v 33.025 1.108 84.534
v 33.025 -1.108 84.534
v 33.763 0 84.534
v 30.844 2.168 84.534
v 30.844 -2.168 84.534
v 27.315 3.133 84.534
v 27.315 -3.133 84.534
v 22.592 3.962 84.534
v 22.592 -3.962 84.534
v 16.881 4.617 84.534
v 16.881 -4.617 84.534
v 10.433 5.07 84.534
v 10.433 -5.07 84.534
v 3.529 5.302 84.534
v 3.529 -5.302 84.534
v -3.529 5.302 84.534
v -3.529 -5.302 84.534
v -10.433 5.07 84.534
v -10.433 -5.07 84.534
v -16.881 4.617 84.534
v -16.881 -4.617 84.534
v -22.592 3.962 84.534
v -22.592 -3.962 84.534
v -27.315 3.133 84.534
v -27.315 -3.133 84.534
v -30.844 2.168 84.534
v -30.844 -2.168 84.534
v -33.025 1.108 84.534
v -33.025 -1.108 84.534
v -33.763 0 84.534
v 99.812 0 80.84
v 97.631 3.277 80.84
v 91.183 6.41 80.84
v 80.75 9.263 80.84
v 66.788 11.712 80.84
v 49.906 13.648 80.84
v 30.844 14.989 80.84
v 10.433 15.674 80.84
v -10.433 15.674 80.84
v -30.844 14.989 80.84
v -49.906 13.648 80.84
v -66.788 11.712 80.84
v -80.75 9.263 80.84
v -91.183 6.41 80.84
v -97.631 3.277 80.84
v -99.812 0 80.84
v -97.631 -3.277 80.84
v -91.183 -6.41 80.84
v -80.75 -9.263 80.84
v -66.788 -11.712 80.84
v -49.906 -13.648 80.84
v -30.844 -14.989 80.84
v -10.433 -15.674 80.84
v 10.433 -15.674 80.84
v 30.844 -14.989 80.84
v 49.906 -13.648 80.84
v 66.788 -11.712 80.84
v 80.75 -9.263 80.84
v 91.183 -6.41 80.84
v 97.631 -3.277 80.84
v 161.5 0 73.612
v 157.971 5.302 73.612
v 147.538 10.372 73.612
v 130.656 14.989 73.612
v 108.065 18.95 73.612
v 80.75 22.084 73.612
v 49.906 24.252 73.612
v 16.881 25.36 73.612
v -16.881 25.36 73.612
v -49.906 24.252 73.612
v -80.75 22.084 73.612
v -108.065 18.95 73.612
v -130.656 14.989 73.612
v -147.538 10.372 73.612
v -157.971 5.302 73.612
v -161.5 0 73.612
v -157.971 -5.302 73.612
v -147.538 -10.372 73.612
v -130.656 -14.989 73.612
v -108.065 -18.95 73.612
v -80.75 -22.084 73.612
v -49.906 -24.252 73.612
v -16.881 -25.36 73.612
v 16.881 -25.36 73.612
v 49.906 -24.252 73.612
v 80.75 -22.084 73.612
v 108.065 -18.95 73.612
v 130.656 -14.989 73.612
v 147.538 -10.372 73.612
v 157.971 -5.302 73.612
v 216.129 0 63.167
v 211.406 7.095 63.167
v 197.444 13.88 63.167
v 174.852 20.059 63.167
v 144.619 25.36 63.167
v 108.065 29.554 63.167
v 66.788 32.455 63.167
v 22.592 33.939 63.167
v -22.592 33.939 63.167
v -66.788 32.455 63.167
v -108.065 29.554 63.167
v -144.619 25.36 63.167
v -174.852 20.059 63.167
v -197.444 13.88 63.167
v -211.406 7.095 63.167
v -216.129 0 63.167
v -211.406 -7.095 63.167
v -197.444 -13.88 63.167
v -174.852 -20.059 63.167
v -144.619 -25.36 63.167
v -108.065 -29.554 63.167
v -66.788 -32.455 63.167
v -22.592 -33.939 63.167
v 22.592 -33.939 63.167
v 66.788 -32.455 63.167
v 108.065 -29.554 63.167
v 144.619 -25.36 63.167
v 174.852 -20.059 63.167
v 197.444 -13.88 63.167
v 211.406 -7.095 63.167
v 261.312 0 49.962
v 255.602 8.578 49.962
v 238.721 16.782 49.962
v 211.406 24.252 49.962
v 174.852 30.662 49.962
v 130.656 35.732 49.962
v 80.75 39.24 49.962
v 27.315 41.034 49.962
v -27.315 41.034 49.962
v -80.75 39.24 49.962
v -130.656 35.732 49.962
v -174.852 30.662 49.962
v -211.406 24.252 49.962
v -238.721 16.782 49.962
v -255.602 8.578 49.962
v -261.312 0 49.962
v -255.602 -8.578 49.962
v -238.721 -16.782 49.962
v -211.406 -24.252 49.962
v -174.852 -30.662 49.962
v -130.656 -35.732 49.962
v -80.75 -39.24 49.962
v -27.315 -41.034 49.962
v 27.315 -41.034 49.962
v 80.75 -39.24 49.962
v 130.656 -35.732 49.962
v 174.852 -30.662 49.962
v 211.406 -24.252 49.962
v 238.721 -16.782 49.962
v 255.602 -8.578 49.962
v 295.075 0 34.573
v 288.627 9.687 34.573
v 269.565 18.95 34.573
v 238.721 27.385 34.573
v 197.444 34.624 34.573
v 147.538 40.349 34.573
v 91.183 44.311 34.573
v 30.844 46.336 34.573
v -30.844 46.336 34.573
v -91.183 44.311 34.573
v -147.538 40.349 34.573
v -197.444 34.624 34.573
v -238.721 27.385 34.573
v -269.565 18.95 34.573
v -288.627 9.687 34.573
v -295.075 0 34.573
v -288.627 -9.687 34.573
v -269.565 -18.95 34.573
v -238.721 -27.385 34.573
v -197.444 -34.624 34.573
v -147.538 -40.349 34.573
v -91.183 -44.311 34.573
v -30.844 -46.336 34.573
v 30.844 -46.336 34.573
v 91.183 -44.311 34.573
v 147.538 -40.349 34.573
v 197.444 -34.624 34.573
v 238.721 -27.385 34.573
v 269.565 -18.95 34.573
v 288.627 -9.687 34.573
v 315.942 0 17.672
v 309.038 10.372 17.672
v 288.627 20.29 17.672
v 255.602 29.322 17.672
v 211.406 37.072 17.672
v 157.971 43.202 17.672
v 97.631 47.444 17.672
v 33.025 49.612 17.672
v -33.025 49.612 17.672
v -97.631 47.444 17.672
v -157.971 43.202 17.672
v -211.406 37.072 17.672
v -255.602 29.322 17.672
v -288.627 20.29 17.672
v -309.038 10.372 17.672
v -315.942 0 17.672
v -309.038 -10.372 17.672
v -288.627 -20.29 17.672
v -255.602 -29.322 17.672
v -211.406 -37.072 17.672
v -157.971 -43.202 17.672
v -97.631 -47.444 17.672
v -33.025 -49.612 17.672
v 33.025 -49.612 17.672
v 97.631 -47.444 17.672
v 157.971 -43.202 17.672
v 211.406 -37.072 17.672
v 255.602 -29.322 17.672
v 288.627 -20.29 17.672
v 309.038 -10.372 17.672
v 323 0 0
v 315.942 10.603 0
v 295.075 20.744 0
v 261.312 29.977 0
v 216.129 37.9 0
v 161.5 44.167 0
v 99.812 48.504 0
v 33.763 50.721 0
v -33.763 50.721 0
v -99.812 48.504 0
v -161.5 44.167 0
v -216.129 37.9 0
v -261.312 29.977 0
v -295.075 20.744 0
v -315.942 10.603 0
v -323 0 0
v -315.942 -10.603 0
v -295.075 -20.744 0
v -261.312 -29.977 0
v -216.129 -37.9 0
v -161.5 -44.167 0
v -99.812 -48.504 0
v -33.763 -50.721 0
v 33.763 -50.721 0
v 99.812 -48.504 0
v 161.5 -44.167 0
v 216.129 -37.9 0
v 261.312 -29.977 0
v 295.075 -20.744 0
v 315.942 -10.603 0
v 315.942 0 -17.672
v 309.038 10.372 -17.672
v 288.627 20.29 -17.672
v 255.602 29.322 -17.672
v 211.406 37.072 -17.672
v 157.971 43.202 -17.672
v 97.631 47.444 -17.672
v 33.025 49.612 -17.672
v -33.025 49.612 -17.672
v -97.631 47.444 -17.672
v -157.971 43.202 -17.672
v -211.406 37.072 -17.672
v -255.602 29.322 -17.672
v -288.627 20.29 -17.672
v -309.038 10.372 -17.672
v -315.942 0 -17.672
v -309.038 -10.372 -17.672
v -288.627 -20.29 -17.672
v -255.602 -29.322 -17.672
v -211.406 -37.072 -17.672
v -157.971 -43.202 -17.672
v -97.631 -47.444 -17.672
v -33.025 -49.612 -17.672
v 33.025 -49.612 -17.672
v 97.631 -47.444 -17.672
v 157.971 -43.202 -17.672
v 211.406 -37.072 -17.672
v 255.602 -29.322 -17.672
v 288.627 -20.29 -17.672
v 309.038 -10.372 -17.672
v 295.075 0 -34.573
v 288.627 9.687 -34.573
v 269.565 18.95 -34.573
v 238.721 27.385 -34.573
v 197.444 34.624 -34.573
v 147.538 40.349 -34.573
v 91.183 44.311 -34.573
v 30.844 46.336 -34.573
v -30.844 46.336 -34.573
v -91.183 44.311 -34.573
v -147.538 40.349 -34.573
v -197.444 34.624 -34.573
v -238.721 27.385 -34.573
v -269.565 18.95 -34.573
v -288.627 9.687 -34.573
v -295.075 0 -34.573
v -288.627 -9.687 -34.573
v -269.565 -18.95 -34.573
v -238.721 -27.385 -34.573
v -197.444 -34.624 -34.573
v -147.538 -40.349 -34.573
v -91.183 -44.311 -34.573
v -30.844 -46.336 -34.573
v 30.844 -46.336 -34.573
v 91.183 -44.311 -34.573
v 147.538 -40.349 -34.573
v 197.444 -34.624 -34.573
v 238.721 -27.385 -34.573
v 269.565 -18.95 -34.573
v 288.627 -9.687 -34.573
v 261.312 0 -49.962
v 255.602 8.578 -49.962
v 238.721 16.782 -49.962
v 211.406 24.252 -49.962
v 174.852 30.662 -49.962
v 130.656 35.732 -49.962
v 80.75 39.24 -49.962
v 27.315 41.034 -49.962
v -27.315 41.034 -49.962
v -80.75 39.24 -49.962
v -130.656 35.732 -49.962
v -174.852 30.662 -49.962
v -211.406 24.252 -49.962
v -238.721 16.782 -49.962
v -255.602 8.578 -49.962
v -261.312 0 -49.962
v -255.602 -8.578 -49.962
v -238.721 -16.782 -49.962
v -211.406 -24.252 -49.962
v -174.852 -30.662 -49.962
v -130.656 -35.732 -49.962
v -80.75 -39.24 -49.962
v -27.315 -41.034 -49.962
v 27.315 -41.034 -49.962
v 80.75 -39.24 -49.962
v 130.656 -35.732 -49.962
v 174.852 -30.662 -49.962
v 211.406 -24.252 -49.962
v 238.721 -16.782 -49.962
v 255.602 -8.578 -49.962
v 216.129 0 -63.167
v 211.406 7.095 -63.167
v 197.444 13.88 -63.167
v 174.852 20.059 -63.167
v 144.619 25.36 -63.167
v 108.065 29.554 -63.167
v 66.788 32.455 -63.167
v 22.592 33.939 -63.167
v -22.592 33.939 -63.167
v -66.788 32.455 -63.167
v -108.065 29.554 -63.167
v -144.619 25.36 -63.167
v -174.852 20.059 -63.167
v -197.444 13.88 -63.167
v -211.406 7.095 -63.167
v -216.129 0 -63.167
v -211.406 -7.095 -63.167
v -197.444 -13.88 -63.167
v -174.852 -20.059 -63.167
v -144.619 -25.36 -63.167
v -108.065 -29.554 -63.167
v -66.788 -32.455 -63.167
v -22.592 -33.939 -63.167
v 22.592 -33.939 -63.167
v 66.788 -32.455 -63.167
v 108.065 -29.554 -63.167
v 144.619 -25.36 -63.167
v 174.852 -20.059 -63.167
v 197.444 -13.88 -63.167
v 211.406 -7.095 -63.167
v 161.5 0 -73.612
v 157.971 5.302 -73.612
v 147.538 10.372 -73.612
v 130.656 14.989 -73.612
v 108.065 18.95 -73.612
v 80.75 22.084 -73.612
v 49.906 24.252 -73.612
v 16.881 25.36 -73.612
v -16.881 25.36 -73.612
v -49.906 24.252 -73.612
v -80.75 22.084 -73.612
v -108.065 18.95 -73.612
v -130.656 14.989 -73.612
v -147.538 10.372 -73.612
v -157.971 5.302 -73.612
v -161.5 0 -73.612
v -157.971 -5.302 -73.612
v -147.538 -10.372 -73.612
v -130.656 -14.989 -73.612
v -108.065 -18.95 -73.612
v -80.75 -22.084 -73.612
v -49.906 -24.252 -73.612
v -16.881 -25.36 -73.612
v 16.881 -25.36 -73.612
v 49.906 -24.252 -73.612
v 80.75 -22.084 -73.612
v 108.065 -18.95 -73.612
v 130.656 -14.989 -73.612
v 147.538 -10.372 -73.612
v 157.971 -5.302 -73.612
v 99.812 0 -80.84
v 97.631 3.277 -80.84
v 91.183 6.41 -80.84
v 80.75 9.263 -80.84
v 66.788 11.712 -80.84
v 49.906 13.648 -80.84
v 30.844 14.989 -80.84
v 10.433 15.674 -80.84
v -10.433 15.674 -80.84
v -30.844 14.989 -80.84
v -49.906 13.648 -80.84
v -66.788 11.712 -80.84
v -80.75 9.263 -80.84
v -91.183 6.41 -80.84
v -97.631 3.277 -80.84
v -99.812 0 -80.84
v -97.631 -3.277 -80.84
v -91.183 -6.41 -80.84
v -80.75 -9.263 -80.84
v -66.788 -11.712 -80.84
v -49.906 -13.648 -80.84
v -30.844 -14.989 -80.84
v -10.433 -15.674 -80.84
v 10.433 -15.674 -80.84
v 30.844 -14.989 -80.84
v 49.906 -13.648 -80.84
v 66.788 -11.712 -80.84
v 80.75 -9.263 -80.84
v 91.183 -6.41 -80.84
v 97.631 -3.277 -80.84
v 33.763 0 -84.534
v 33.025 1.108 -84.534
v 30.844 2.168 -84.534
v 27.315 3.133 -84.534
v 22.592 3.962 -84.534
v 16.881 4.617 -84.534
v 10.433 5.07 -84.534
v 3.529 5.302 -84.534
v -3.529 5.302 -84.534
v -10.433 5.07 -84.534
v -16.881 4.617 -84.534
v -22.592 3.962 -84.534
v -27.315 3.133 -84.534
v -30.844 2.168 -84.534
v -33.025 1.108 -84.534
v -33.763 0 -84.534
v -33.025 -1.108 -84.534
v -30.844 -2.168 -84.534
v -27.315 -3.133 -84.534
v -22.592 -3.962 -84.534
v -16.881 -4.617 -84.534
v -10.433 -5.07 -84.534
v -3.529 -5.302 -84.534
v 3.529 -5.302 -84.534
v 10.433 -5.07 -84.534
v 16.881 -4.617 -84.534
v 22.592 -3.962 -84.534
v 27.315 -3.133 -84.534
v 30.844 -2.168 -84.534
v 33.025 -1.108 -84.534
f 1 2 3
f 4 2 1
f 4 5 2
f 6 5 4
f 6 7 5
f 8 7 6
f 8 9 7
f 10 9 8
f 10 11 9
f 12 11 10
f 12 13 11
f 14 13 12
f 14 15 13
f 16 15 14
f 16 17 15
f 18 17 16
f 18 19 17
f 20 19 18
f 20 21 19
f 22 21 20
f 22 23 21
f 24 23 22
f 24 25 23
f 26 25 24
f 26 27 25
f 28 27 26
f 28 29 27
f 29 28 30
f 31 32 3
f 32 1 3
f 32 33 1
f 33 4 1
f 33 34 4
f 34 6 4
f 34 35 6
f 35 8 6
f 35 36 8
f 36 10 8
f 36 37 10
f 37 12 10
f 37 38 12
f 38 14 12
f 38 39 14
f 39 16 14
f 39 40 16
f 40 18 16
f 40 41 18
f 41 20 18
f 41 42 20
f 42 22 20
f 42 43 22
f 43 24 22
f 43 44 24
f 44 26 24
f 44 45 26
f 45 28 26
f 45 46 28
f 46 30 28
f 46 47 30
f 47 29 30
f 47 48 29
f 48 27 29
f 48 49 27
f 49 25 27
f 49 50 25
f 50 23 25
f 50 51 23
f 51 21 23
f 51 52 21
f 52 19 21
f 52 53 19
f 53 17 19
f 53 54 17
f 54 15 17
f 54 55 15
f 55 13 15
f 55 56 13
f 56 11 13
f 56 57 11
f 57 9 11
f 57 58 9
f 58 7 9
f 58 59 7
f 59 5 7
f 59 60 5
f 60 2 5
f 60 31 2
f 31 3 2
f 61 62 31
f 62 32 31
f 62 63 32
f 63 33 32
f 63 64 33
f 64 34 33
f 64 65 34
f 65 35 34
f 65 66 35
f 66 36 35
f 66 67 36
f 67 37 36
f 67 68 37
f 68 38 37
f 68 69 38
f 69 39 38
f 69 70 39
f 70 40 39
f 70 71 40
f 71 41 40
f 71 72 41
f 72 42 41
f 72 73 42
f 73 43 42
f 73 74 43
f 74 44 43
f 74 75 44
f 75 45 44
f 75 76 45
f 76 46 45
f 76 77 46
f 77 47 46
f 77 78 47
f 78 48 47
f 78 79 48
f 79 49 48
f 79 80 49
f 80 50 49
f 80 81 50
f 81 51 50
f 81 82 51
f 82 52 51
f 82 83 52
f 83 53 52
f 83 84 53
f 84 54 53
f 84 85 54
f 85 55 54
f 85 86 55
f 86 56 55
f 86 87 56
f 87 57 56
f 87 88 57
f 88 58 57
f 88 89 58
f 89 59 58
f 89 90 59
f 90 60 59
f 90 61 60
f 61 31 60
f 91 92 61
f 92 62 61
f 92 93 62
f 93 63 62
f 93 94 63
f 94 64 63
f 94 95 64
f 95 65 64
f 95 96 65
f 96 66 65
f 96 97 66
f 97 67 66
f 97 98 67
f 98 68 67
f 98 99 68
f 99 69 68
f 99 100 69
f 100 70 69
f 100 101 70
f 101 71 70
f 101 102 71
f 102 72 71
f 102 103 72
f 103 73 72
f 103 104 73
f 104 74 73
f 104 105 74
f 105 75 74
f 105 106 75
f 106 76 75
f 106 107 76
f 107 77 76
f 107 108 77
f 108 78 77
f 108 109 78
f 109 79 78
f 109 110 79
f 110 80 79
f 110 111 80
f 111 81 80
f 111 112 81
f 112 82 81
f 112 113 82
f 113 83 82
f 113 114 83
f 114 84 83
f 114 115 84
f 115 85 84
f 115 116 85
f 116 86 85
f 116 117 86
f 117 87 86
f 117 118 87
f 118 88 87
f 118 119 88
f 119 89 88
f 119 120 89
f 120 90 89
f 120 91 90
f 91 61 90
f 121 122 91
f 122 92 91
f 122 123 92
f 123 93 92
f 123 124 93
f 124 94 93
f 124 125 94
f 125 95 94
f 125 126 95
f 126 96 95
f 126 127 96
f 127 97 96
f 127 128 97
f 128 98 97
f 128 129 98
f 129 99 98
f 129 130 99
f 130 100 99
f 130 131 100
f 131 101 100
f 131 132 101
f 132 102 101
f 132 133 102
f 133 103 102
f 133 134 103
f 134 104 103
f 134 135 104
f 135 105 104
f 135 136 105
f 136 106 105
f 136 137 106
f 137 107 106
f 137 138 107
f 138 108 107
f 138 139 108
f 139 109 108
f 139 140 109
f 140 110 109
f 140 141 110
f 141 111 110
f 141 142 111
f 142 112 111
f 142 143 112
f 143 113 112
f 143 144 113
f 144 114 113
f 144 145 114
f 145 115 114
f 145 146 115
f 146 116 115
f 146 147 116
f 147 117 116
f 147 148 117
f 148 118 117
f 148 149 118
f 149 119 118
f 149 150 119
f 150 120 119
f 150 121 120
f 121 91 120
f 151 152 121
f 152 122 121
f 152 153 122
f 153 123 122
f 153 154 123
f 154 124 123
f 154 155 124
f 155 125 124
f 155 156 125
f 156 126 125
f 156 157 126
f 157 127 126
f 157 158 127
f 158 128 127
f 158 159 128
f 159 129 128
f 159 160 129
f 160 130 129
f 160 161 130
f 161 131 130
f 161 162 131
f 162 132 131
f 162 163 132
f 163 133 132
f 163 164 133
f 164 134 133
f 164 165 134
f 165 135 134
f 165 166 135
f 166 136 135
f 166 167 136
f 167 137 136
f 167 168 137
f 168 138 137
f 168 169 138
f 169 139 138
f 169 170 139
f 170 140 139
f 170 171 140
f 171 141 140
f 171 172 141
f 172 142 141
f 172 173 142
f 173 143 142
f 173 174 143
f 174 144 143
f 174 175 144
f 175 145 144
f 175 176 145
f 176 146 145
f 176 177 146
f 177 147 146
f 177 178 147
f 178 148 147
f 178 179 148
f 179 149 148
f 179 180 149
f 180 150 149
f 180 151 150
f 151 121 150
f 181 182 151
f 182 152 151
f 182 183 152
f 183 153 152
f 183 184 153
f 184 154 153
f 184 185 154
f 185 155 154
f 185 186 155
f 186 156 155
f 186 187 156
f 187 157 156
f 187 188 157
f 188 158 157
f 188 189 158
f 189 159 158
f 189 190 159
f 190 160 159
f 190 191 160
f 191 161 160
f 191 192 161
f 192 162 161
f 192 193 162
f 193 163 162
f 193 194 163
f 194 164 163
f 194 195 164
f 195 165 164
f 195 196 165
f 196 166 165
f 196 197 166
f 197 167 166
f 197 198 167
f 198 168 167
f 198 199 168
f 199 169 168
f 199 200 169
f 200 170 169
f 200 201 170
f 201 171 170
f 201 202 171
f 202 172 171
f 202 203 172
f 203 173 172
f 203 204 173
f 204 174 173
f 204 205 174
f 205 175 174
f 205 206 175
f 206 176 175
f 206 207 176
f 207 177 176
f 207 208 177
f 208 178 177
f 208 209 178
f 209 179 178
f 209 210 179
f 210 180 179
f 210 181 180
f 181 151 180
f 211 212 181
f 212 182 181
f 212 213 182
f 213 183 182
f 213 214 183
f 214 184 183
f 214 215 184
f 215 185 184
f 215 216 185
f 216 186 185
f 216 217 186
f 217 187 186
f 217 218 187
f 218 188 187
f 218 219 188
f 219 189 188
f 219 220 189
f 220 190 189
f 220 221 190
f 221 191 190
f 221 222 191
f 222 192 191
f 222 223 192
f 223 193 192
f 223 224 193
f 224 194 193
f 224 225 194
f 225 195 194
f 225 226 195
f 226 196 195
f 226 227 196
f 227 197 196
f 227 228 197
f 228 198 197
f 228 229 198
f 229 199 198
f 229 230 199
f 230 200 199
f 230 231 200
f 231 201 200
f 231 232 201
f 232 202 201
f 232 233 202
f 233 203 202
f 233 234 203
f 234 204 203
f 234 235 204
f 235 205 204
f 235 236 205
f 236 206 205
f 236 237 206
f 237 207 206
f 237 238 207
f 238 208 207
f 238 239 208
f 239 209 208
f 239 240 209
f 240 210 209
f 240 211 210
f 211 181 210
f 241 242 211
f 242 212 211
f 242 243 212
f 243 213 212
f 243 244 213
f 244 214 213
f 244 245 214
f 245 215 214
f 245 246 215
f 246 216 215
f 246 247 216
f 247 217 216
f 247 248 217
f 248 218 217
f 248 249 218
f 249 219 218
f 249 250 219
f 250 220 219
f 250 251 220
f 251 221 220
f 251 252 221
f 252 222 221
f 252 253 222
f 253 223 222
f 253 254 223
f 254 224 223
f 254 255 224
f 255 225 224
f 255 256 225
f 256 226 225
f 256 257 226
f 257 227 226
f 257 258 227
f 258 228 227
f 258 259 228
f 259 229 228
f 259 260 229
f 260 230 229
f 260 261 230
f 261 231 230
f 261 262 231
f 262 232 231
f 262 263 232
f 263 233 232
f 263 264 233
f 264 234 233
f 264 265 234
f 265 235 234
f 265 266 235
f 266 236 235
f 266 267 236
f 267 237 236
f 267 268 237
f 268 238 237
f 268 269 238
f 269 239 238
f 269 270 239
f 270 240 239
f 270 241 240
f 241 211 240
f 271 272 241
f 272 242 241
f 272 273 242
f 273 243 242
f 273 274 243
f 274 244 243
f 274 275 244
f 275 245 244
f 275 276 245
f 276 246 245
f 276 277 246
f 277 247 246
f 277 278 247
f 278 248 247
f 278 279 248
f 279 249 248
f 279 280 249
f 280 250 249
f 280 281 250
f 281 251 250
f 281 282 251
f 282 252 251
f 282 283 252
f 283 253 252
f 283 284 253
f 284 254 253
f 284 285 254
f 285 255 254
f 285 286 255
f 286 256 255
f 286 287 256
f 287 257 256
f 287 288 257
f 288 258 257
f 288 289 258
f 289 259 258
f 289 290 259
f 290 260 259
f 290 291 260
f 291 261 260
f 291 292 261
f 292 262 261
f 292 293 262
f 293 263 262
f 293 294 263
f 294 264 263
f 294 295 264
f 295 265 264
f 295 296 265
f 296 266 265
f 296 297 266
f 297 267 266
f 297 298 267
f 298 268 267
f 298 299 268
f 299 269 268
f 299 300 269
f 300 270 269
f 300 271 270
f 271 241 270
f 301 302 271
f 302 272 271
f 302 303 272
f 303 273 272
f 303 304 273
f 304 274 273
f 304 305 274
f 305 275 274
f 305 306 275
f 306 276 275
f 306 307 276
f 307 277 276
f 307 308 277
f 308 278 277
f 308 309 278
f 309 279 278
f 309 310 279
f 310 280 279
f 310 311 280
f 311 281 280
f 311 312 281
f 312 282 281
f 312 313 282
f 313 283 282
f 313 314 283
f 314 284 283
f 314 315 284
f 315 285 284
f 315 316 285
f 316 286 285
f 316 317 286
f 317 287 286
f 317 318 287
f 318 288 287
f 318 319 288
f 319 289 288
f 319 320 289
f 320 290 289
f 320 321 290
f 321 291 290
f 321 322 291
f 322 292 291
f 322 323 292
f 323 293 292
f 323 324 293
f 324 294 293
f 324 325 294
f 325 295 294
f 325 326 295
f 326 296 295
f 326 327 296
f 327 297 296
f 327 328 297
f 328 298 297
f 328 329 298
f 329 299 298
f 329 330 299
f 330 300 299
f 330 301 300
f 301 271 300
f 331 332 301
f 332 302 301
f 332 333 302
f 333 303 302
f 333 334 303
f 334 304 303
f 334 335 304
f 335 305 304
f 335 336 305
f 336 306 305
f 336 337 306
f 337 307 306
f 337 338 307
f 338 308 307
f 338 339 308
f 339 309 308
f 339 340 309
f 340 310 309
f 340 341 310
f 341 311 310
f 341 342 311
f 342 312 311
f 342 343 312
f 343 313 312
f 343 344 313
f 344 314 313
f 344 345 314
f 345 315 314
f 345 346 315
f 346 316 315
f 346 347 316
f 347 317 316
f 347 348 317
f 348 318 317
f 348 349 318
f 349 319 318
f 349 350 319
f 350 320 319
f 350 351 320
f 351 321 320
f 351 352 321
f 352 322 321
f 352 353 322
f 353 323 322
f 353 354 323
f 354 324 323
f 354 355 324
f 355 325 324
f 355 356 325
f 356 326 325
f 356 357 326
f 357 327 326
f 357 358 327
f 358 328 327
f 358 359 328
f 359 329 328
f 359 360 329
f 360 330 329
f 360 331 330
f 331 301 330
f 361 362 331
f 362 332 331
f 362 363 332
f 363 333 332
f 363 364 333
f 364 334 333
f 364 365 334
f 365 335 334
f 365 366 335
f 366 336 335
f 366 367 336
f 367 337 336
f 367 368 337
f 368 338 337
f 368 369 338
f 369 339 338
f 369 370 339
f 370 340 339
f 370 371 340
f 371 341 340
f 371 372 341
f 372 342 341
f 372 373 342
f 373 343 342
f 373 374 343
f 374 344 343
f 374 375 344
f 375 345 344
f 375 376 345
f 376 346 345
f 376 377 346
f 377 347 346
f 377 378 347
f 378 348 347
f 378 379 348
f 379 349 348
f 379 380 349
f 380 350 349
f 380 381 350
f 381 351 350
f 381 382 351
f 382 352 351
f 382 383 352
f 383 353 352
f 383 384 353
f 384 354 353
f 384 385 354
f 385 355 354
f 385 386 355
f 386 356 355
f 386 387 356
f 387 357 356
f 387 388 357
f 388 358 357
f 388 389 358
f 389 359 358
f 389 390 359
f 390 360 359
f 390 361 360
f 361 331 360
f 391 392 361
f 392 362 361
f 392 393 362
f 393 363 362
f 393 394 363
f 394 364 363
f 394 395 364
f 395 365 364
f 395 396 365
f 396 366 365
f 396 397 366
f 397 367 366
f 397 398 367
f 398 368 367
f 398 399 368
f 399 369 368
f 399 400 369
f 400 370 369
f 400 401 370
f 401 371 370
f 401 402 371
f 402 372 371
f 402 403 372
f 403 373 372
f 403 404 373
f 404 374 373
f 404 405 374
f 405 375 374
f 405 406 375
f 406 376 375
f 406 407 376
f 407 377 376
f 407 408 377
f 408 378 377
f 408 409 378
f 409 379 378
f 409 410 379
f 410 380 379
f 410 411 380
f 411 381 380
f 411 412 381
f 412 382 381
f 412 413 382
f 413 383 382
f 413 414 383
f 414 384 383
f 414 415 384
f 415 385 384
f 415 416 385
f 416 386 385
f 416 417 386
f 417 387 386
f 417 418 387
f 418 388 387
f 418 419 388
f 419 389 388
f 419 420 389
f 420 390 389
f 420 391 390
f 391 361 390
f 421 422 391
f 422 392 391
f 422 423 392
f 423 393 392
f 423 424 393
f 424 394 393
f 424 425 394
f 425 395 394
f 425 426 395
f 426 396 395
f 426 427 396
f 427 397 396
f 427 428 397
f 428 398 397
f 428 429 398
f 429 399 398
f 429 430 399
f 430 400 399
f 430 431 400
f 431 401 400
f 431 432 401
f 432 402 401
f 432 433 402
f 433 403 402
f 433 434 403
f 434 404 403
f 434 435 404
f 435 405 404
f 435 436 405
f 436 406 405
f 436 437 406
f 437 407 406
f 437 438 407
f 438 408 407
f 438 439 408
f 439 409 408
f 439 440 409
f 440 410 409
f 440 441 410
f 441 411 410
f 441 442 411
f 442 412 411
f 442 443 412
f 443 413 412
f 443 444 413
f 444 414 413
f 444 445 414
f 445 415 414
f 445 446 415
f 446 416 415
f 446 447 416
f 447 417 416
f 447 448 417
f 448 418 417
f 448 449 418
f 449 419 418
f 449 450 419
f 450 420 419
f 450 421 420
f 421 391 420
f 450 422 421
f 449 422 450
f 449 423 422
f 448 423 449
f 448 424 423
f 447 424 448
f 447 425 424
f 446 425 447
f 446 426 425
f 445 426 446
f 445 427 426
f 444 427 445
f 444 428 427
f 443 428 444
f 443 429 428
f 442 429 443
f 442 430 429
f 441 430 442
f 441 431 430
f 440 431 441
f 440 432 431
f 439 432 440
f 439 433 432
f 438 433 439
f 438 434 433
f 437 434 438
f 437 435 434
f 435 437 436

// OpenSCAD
// Generated by SolidPython 1.0.1 on 2020-07-29 00:46:53


scale(v = [19, 3, 5]) {
	sphere(r = 17);
}
/***********************************************
*********      SolidPython code:      **********
************************************************
 
# import packages: SolidPython
from solid import *
from solid.utils import *
from itertools import chain, combinations, permutations


class Resize:

    def __init__(self, scad_file):
        self.scad_file = scad_file
        #self.scad_file = import_scad(scad_file)
        # cone/cylinder param:
        self.r1 = 0
        self.r2 = 0
        self.h = 0
        # rectangular prism param:
        self.w = 0
        self.l = 0
        # ellipse param:
        self.r = 0

    # import OpenScad code (file name corresponds to shape)


    # classify shape + parameters
    def assign(self, param1, param2, param3):
        if self.scad_file == 'cone.scad':
            self.r1 = param1
            self.r2 = param2
            self.h = param3
        elif self.scad_file == 'cylinder.scad':
            self.r1 = param1
            self.r2 = param2
            self.h = param3
        elif self.scad_file == 'rectangularPrism.scad':
            self.h = param1
            self.l = param2
            self.w = param3
        else:
            self.r = param1
            self.h = param2

    # resize parameters
    def iterate(self):
        x = range(3, 20, 2)
        i = 1
        if self.scad_file == 'cone.scad':
            tempList = list(permutations(x, 2))
            for temp in tempList:
                param1 = temp[0]
                param2 = temp[1]
                filepath = 'produced_scad_files/' + 'cone' + str(param1) + '_' + str(param2) + '_' + '.scad'
                scad_render_to_file(cylinder(h=param1, r1=param2, r2=0), filepath)

        elif self.scad_file == 'cylinder.scad':
            tempList = list(permutations(x, 3))
            for temp in tempList:
                param1 = temp[0]
                param2 = temp[1]
                filepath = 'produced_scad_files/' + 'cylinder' + str(param1) + '_' + str(param2) + '_' + '.scad'
                scad_render_to_file(cylinder(h=param1, r1=param2, r2=param2), filepath)

        elif self.scad_file == 'rectangularPrism.scad':
            tempList = list(permutations(x, 3))
            for temp in tempList:
                param1 = temp[0]
                param2 = temp[1]
                param3 = temp[2]
                filepath = 'produced_scad_files/' + 'rectangularPrism' + str(param1) + '_' + str(param2) + '_' + str(
                    param3) + '.scad'
                scad_render_to_file(cube(size=(param1, param2, param3)), filepath)

        elif self.scad_file == 'ellipse.scad':
            tempList = list(permutations(x, 4))
            for temp in tempList:
                param1 = temp[0]
                param2 = temp[1]
                param3 = temp[2]
                param4 = temp[3]
                filepath = 'produced_scad_files/' + 'ellipse' + str(param1) + '_' + str(param2) + '_' + str(param3) + '_' + str(param4) + '.scad'
                scad_render_to_file(scale([param1, param2, param3])(sphere(r=param4)), filepath)

    def render_to_scadfile(self):
        scad_render_to_file(scad, 'example.scad') 
 
************************************************/
